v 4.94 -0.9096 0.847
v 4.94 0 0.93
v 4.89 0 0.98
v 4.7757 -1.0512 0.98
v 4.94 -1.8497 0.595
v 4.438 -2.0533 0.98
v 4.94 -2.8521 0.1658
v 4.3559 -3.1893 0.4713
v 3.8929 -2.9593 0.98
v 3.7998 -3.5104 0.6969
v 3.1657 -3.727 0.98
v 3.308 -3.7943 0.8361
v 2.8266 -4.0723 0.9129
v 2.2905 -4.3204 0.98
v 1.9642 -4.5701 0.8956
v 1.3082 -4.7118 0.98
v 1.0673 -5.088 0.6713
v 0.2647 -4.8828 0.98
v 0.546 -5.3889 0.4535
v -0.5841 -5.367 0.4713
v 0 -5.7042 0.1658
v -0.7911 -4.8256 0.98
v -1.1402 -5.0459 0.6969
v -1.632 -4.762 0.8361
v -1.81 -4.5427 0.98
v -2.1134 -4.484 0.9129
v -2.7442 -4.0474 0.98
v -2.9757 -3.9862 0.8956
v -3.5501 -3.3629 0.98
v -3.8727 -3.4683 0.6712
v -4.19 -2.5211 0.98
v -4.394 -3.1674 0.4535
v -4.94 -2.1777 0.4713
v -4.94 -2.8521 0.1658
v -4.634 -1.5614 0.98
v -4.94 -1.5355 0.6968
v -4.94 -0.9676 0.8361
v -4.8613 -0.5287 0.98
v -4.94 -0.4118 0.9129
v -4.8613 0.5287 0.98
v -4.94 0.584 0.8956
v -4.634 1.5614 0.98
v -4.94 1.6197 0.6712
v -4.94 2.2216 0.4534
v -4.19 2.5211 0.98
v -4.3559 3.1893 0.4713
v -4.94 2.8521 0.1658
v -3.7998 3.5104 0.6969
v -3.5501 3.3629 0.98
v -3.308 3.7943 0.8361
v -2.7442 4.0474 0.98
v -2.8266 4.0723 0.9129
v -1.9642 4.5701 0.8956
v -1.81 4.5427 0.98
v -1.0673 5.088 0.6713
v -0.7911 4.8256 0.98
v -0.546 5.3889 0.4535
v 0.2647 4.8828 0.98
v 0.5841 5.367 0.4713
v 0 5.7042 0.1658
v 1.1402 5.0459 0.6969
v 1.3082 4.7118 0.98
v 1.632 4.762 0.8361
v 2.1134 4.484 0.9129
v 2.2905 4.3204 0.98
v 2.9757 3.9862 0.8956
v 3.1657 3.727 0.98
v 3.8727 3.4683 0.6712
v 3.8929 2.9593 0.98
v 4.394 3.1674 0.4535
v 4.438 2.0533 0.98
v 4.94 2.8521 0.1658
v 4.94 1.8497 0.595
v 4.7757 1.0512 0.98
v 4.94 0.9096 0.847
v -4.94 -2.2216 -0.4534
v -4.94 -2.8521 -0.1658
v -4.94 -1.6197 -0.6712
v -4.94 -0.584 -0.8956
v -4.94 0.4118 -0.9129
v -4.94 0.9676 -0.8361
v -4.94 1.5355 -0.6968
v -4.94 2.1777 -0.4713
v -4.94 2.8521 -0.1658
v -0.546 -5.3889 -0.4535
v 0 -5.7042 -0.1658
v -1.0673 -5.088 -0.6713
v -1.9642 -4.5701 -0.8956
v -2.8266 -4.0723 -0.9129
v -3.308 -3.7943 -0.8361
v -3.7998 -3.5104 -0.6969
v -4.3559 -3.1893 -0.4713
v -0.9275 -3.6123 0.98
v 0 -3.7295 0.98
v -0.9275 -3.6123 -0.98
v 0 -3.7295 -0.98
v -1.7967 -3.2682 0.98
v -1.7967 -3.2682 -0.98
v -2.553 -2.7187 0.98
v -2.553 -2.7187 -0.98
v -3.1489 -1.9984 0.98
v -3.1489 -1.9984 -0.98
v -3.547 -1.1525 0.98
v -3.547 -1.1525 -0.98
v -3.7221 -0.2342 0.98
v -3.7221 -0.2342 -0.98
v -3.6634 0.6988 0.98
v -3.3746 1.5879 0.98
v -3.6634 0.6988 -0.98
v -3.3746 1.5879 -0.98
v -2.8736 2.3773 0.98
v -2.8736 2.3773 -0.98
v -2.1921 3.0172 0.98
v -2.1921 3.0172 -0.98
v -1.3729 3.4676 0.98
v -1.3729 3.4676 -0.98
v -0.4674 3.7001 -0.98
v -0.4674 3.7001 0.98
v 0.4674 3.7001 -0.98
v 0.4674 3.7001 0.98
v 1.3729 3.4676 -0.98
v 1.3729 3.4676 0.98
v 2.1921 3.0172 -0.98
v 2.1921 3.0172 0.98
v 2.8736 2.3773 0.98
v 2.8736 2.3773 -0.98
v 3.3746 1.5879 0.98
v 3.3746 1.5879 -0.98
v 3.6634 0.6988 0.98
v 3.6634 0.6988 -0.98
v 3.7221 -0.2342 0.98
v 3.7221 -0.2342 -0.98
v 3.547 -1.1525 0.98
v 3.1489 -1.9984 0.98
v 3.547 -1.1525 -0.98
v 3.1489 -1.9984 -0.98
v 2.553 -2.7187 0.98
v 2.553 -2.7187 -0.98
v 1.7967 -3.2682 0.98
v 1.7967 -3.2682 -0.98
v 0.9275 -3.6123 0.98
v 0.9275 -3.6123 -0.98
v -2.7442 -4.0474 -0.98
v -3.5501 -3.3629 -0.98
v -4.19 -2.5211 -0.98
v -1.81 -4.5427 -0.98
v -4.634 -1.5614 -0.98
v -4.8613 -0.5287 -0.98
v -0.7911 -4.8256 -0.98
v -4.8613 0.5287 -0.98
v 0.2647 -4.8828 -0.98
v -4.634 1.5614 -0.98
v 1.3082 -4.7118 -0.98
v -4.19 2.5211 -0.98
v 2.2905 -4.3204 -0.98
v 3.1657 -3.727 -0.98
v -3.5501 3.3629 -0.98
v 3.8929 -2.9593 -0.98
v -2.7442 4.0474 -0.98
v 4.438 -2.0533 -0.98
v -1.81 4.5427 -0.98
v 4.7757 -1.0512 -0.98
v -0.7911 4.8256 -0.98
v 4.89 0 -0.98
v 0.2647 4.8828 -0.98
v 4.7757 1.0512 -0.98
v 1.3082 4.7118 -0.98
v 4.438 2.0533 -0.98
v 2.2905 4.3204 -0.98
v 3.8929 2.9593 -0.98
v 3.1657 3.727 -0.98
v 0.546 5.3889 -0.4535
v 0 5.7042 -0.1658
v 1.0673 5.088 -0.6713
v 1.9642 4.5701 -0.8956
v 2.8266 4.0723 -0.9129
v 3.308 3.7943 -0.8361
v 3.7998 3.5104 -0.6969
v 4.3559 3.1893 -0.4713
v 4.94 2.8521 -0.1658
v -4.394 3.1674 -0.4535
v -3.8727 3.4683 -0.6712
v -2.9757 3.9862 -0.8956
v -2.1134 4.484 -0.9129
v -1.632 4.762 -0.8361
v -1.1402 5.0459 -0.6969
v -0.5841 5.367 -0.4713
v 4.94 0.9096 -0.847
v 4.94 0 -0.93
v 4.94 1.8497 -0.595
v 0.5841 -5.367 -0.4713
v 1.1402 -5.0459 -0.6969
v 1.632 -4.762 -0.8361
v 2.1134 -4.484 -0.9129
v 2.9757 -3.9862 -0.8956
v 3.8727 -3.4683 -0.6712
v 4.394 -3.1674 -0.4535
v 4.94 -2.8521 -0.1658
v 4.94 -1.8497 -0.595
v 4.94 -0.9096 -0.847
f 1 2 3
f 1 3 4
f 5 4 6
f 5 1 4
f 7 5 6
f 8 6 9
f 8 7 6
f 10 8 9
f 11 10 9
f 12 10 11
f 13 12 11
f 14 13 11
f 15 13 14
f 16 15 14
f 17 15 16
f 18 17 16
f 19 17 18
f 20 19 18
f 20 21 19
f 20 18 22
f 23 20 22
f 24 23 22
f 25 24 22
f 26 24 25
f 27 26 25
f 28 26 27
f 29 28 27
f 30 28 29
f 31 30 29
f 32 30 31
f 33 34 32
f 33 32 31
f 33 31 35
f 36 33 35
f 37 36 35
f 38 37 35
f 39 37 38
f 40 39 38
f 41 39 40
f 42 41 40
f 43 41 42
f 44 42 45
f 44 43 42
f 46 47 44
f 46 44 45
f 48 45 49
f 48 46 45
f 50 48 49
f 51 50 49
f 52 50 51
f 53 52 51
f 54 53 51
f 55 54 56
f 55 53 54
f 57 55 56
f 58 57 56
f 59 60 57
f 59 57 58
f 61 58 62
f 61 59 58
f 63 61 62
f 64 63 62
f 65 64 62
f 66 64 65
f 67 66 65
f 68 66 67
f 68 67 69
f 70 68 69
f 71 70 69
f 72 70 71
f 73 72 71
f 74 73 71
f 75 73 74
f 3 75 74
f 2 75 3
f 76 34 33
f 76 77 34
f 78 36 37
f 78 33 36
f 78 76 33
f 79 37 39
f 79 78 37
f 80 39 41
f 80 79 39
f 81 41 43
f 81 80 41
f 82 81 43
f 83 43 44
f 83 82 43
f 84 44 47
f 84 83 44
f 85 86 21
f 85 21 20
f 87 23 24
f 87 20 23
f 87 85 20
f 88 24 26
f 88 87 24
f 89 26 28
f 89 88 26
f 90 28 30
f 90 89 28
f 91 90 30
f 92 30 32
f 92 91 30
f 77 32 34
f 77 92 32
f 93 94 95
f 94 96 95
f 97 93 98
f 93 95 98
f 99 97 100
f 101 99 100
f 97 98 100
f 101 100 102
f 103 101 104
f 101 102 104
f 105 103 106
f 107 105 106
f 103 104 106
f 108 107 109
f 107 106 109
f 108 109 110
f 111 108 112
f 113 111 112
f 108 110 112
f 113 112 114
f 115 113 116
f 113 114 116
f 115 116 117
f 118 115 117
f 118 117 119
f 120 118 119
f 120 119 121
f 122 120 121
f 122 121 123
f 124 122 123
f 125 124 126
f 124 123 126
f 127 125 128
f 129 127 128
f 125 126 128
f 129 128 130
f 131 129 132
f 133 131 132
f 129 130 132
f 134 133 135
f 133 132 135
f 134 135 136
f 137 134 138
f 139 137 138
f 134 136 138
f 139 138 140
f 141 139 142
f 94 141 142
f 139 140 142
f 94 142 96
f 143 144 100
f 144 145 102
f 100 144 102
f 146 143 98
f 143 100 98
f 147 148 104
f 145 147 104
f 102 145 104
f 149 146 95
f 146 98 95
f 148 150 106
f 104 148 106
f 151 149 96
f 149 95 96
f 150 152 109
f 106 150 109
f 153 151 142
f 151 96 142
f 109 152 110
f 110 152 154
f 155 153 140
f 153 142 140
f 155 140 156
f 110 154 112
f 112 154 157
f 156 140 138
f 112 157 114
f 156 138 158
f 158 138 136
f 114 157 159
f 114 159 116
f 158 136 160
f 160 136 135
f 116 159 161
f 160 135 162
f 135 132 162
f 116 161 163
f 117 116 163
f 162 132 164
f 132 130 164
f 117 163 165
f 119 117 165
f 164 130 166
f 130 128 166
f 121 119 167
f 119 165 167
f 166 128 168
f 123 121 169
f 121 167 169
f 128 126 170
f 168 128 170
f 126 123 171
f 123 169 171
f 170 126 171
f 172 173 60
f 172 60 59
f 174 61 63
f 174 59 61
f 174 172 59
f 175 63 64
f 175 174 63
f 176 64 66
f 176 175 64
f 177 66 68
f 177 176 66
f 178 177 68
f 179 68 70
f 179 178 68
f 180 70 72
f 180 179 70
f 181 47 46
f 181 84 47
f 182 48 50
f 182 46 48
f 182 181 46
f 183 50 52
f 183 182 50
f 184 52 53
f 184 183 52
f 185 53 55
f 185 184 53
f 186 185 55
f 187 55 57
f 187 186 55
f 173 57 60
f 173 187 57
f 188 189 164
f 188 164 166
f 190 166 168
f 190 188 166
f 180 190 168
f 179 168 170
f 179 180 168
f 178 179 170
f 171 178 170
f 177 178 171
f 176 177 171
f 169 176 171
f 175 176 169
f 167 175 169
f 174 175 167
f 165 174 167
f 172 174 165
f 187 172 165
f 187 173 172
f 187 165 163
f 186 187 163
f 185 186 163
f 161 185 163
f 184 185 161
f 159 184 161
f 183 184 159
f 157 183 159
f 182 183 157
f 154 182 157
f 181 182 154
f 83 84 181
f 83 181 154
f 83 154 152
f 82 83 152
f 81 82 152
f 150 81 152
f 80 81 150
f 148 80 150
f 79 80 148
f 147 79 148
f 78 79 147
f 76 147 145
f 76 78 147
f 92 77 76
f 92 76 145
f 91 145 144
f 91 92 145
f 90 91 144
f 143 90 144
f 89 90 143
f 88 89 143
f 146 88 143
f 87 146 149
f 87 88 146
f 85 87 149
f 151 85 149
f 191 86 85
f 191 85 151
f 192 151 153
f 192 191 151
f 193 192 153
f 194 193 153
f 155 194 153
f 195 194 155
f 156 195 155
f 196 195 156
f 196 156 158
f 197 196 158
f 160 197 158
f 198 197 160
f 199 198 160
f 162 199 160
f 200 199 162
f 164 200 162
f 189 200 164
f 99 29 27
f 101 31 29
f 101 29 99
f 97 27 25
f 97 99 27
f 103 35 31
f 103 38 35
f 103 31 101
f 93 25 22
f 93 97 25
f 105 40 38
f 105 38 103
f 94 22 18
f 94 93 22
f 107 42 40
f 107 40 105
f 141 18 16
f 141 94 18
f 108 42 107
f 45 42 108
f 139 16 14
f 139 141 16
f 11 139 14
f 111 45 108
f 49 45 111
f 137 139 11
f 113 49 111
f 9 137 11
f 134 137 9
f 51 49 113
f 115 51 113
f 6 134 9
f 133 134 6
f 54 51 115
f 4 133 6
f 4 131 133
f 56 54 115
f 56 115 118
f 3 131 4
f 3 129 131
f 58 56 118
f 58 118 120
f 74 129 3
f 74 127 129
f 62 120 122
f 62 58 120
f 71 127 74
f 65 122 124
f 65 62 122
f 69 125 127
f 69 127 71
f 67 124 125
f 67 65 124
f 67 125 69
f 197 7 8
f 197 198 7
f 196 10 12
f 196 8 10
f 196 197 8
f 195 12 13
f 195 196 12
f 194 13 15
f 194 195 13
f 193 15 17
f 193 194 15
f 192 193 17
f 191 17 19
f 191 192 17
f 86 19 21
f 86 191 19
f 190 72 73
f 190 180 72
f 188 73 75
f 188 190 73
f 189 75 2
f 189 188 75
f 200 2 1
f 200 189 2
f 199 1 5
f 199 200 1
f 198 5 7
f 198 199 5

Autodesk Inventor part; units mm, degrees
ref_plane "YZ Plane" through (0, 0, 0) normal (1, 0, 0) x (0, 1, 0)
ref_plane "XZ Plane" through (0, 0, 0) normal (0, 1, 0) x (-1, 0, 0)
ref_plane "XY Plane" through (0, 0, 0) normal (0, 0, 1) x (1, 0, 0)
sketch "Esquisse1" plane through (0, 0, 0) normal (0, 0, 1) x (1, 0, 0)
  line L0 (4.94, 2.8521) -> (4.94, -2.8521)
  line L1 (4.94, -2.8521) -> (0, -5.7042)
  line L2 (0, -5.7042) -> (-4.94, -2.8521)
  line L3 (-4.94, -2.8521) -> (-4.94, 2.8521)
  line L4 (-4.94, 2.8521) -> (0, 5.7042)
  line L5 (0, 5.7042) -> (4.94, 2.8521)
  point P0 (0, 0)
  point P1 (0, 0)
  dimension "d0" = 9.88
extrude "Extrusion1" add sketch "Esquisse1" along normal mid plane 1.96
sketch "Esquisse2" plane through (0, 0, 0.98) normal (0, 0, 1) x (1, 0, 0)
  point P0 (0, 0)
  point P1 (0, 0)
hole "Perçage1" at (0, 0, 0.98) direction (0, 0, -1) diameter 7.459 depth 18.8 tip angle 118 thread size "M8x0.5" class "6H" standard "ISO Metric profile"
sketch "Esquisse3" plane through (0, 0, 0) normal (0, 1, 0) x (-1, 0, 0)
  line L0 (-4.94, 0.98) -> (0, 0.98) construction
  line L1 (-4.94, -0.98) -> (-4.94, 0.98) construction
  line L2 (-3.94, 1.93) -> (-5.94, -0.07)
  line L3 (-5.94, -0.07) -> (-5.94, 1.93)
  line L4 (-5.94, 1.93) -> (-3.94, 1.93)
  line L5 (0, -1.432) -> (0, 1.732) projected
  point P0 (0, 0)
  point P1 (-4.89, 0.98)
  point P2 (-4.94, 0.93)
  point P3 (-4.94, 1.93)
  dimension "d12" = 0.05
  dimension "d13" = 0.05
  dimension "d14" = 2
revolve "Révolution1" cut sketch "Esquisse3" angle 360 about axis through (0, 0, -10) along (0, 0, 1)
mirror "Symétrie1" about plane through (0, 0, 0) normal (0, 0, 1) of "Révolution1"
equation "\"d13\" = d12"
properties part number "Ecrou plug alimentation" material "----------"
